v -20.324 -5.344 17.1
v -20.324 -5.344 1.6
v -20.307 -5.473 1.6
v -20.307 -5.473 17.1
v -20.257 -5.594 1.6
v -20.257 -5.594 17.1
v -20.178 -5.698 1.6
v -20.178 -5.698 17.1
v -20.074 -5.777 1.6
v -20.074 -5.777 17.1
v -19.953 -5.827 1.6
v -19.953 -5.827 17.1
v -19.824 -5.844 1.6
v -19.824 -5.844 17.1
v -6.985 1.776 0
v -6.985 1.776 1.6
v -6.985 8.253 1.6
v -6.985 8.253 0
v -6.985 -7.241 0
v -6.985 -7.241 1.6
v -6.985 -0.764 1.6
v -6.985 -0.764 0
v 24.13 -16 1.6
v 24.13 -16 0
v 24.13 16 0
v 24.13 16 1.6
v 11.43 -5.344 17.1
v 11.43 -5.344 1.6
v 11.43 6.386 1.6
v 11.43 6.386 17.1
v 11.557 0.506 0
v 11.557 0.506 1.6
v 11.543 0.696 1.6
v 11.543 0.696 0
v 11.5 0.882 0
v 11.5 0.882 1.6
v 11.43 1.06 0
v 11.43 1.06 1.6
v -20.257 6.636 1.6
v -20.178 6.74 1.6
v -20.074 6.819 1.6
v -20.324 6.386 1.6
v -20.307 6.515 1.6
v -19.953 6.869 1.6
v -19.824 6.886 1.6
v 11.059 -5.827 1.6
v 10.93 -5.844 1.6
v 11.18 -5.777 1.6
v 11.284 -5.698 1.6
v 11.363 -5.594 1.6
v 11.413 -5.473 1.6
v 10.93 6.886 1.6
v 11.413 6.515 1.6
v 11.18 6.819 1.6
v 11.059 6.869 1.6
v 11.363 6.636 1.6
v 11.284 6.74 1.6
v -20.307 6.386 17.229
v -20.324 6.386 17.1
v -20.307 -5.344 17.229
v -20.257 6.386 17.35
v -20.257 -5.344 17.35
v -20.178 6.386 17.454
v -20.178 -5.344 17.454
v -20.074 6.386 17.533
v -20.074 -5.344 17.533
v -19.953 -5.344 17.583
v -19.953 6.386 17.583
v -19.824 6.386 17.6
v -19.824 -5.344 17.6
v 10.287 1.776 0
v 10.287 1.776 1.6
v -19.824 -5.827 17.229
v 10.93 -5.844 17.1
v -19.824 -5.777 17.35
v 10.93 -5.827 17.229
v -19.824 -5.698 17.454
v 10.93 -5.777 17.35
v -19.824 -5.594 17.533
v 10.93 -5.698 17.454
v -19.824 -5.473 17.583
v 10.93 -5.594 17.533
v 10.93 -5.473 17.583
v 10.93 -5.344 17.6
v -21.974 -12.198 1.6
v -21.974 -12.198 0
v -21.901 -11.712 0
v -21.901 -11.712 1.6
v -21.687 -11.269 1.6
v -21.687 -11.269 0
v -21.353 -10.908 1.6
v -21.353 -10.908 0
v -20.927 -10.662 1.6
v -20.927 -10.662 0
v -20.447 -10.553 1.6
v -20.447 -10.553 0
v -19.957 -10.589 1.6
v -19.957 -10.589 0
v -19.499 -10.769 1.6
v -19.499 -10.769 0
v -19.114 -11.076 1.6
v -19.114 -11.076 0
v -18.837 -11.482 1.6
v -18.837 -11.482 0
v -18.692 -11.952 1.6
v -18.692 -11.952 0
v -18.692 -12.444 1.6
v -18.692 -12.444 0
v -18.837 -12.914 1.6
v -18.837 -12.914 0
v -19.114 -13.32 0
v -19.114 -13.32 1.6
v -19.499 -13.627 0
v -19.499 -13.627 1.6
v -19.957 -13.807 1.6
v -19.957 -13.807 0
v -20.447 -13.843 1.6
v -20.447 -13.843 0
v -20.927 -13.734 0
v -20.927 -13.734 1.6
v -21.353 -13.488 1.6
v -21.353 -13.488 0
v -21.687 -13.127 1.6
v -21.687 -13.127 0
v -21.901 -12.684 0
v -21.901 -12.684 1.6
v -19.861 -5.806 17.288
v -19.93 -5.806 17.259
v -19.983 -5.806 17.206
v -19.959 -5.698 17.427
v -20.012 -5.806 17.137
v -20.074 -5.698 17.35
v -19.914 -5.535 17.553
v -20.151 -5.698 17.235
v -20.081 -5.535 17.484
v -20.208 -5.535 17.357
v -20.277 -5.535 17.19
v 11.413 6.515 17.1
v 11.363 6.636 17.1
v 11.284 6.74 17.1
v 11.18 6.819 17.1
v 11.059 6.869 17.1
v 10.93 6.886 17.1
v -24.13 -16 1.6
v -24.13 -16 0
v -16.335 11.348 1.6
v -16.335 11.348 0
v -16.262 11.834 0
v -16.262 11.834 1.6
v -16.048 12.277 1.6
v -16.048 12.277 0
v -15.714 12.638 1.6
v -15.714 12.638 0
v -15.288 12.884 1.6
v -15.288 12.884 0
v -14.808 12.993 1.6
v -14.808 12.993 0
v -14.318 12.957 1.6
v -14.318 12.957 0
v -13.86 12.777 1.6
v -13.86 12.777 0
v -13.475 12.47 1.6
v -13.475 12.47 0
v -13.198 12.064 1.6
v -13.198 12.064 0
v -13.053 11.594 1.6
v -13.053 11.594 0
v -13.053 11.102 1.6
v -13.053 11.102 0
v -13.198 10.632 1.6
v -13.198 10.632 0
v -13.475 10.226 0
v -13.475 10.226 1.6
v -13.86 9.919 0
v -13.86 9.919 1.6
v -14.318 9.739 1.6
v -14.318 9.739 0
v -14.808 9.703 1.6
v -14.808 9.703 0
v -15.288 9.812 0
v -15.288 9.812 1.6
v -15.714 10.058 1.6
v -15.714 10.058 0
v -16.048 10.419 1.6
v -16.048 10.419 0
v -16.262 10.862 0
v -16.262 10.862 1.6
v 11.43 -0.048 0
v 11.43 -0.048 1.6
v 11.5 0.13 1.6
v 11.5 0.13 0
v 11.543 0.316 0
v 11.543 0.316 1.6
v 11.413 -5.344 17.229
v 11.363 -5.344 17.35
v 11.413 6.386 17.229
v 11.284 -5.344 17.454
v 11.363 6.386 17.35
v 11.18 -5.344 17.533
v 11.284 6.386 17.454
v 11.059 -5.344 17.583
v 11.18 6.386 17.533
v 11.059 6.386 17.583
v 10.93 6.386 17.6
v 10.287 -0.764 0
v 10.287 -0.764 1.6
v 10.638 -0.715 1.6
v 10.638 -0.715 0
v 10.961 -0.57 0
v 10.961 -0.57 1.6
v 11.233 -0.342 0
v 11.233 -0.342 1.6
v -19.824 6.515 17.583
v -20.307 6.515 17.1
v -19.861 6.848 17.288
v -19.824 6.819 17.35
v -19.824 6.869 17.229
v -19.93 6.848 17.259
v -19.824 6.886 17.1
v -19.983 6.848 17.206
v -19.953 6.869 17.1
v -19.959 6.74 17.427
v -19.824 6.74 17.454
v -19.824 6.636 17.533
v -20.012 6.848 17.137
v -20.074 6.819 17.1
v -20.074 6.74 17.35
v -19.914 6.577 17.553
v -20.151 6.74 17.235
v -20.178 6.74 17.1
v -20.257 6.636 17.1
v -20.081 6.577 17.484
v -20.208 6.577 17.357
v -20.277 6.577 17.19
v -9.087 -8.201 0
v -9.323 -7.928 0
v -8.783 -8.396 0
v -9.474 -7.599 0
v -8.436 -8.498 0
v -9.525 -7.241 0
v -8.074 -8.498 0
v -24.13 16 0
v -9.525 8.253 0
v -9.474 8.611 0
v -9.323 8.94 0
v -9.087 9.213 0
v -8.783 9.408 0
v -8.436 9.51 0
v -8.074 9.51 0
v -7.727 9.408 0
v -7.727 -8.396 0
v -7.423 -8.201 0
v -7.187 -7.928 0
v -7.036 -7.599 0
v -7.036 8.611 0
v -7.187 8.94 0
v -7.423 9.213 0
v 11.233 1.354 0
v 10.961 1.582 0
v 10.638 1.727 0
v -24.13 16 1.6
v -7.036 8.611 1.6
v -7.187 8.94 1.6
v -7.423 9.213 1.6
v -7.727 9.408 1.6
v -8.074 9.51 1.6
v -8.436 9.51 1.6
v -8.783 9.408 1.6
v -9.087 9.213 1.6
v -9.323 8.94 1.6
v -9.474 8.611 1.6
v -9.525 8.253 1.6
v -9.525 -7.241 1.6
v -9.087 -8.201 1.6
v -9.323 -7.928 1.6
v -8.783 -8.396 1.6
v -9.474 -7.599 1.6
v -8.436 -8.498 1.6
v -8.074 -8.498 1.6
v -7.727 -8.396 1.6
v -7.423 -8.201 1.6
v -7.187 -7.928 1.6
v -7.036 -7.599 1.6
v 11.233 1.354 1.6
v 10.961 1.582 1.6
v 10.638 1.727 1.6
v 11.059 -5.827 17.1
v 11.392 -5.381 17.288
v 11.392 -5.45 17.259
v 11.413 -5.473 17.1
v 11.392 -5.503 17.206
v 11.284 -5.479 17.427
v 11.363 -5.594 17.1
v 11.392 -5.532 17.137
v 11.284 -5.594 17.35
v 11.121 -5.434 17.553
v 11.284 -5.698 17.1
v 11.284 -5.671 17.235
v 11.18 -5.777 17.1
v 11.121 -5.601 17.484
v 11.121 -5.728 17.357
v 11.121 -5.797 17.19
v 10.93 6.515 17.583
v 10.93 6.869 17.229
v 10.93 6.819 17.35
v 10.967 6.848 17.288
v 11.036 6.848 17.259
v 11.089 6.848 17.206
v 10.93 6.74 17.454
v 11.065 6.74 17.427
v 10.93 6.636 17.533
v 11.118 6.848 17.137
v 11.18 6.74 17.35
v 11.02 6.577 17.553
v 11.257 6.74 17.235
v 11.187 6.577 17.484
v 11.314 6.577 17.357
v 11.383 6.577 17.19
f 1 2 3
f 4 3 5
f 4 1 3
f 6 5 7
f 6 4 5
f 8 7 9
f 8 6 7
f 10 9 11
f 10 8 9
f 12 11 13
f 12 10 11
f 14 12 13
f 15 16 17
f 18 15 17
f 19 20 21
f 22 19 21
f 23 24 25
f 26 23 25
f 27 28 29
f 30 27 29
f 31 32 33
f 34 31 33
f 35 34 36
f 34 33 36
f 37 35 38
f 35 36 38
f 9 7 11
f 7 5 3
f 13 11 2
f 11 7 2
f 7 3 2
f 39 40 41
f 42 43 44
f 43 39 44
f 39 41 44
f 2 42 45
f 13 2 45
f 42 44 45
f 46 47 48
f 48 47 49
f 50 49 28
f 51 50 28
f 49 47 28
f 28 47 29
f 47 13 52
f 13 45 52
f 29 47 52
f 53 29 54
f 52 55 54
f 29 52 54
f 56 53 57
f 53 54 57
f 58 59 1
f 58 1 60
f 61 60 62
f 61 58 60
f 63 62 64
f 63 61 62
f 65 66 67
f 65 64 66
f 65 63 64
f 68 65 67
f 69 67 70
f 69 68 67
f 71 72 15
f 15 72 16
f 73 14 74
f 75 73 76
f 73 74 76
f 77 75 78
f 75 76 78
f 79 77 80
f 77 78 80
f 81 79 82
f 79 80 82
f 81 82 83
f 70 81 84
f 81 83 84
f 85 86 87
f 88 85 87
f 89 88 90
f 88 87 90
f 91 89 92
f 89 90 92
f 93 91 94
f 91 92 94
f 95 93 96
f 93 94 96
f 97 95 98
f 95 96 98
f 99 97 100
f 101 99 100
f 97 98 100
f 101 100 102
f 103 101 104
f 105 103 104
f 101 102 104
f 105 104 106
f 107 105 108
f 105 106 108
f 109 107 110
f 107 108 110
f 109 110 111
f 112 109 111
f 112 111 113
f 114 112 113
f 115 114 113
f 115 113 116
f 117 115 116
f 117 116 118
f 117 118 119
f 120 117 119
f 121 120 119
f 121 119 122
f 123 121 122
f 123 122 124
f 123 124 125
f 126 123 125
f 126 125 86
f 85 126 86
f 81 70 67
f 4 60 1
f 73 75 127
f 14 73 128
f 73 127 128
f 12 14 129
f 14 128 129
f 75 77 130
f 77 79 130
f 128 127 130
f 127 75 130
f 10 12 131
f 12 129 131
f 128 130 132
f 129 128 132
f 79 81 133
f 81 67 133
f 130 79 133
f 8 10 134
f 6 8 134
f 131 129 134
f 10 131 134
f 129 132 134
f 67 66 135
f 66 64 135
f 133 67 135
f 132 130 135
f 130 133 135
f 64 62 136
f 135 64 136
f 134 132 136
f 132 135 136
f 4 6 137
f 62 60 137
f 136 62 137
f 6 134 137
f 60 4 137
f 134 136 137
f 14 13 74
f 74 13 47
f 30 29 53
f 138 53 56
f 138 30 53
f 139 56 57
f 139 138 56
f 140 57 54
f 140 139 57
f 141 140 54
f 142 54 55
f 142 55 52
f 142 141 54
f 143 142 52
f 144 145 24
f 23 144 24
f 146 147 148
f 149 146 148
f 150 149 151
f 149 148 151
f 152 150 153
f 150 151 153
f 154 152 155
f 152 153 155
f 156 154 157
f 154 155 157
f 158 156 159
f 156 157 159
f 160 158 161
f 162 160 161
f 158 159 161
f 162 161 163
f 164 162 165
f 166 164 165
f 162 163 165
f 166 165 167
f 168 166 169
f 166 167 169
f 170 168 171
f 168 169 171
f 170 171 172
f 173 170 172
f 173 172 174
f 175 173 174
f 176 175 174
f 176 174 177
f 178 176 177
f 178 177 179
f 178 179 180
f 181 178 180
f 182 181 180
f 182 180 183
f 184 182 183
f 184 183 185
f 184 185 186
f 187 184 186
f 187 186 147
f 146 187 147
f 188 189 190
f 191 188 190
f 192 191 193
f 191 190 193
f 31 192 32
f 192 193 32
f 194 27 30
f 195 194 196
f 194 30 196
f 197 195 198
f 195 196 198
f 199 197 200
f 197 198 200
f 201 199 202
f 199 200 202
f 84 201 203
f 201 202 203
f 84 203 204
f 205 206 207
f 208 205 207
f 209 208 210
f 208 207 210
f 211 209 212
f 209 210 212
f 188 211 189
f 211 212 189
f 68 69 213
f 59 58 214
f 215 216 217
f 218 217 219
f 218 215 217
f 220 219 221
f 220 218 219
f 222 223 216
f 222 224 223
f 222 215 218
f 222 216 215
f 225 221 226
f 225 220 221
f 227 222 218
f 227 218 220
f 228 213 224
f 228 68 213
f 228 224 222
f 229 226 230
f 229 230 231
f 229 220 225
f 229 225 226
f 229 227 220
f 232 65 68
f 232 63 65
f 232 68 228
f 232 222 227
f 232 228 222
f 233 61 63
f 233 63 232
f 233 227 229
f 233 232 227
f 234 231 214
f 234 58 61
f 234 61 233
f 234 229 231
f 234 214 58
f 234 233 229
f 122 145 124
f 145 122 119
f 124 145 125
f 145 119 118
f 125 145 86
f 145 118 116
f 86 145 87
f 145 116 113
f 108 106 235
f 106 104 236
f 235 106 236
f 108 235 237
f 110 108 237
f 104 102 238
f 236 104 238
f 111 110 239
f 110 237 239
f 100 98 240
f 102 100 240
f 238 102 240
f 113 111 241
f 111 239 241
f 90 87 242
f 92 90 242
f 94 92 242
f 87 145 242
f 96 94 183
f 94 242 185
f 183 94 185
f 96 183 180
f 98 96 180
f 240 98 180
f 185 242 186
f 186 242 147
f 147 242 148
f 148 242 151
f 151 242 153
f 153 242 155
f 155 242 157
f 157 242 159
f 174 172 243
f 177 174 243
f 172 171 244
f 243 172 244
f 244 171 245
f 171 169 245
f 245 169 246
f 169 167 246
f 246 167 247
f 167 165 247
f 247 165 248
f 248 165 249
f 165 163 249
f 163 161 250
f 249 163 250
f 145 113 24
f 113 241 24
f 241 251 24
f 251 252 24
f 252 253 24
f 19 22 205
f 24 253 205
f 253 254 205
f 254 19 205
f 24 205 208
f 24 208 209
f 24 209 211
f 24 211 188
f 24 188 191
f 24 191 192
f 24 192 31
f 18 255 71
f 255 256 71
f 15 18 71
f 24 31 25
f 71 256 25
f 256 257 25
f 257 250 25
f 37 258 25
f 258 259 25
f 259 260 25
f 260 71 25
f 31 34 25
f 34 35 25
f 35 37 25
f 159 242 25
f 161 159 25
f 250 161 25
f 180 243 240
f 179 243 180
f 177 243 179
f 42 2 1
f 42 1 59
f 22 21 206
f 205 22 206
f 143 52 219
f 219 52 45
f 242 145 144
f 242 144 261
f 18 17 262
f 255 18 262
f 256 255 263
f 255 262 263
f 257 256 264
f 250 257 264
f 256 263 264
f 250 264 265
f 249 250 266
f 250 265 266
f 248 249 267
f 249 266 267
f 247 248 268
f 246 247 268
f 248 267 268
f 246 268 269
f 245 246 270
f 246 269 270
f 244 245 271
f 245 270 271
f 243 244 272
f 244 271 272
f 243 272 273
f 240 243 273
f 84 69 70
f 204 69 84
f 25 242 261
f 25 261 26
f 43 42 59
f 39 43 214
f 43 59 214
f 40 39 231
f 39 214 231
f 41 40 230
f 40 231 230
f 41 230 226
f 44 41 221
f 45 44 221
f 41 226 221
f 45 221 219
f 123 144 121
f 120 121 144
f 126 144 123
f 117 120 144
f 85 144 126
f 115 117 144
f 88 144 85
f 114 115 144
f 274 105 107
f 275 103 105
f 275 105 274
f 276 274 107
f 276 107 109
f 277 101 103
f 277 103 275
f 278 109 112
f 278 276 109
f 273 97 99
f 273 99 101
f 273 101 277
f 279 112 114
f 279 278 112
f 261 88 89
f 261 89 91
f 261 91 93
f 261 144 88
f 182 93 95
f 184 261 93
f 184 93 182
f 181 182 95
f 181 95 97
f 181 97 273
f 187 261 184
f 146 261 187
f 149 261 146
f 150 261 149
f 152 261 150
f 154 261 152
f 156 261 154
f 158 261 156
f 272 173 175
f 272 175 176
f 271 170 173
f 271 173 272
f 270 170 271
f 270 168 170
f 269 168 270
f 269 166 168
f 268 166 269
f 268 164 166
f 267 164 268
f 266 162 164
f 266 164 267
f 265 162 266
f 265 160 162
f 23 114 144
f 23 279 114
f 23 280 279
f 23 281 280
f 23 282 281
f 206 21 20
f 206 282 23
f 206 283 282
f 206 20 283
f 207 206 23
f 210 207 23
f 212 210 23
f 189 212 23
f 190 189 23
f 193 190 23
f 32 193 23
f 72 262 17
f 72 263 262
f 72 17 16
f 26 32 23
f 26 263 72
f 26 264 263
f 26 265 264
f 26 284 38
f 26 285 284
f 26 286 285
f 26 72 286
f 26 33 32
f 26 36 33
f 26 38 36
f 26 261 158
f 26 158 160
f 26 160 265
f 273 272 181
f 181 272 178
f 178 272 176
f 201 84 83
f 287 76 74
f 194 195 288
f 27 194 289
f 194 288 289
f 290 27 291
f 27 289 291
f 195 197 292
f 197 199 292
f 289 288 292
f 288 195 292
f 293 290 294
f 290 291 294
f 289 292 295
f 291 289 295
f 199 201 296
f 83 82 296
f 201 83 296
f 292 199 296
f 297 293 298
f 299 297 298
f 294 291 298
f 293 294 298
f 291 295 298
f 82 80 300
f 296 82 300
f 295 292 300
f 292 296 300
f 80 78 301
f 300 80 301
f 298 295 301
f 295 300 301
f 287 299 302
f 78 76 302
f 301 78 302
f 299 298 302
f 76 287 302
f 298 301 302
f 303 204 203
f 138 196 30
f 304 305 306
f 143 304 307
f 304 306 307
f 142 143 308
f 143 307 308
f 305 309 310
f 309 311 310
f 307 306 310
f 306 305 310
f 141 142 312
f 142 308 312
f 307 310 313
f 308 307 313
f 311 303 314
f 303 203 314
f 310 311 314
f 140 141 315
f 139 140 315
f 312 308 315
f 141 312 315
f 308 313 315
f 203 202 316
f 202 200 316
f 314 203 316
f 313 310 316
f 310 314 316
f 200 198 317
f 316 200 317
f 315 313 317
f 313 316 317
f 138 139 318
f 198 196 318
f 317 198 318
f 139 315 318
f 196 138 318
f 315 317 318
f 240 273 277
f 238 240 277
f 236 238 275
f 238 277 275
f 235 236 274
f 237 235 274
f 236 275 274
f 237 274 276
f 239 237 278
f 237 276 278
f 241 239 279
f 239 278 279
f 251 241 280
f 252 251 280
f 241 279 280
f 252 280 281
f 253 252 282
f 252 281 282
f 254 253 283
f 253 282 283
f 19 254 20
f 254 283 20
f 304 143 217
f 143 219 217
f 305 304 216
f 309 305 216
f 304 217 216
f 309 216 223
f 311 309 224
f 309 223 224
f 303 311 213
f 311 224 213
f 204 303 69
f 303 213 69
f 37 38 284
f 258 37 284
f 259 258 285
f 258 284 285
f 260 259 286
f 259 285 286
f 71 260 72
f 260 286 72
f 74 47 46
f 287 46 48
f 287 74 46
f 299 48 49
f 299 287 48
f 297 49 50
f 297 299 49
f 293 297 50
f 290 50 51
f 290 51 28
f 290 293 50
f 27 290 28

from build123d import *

# Parameters (mm, degrees)
F0_W     = 48.26
F0_H     = 32
F1_DEPTH = 1.6
F2_W     = 1.27
F2_H     = 12.73
F3_DEPTH = 1.601
F2_W_2   = 10.799
F4_DEPTH = 16
F5_R     = 0.5
F6_D     = 3.3


with BuildPart() as f1:
    # F0 (on Top) → F1 (new body)
    with BuildSketch(Plane.XY):
        Rectangle(F0_W, F0_H)
    extrude(amount=F1_DEPTH)

    # F2 (on face) → F3 (cut, through all)
    with BuildSketch(Plane.XY.offset(1.6)):
        with Locations((-8.89, 0.521)):
            Rectangle(F2_W, F2_H)
        with BuildLine():
            Line((-9.525, 8.253), (-9.525, 6.886))
            Line((-9.525, 6.886), (-8.255, 6.886))
            Line((-8.255, 6.886), (-8.255, 6.983))
            ThreePointArc((-8.255, 6.983), (-9.1530256121, 7.3549743879), (-9.525, 8.253))
        make_face()
        with BuildLine():
            ThreePointArc((-6.985, 8.253), (-8.255, 9.523), (-9.525, 8.253))
            ThreePointArc((-9.525, 8.253), (-9.1530256121, 7.3549743879), (-8.255, 6.983))
            ThreePointArc((-8.255, 6.983), (-7.3569743879, 7.3549743879), (-6.985, 8.253))
        make_face()
        with BuildLine():
            Line((-8.255, 6.983), (-8.255, 6.886))
            Line((-8.255, 6.886), (-6.985, 6.886))
            Line((-6.985, 6.886), (-6.985, 8.253))
            ThreePointArc((-6.985, 8.253), (-7.3569743879, 7.3549743879), (-8.255, 6.983))
        make_face()
        with BuildLine():
            Line((-6.985, 6.886), (-8.255, 6.886))
            Line((-8.255, 6.886), (-8.255, -5.844))
            Line((-8.255, -5.844), (-6.985, -5.844))
            Line((-6.985, -5.844), (-6.985, -0.764))
            Line((-6.985, -0.764), (10.287, -0.764))
            ThreePointArc((10.287, -0.764), (9.017, 0.506), (10.287, 1.776))
            Line((10.287, 1.776), (-6.985, 1.776))
            Line((-6.985, 1.776), (-6.985, 6.886))
        make_face()
        with BuildLine():
            Line((-6.985, -5.844), (-8.255, -5.844))
            Line((-8.255, -5.844), (-8.255, -5.971))
            ThreePointArc((-8.255, -5.971), (-7.3569743879, -6.3429743879), (-6.985, -7.241))
            Line((-6.985, -7.241), (-6.985, -5.844))
        make_face()
        with BuildLine():
            Line((-8.255, -5.844), (-9.525, -5.844))
            Line((-9.525, -5.844), (-9.525, -7.241))
            ThreePointArc((-9.525, -7.241), (-9.1530256121, -6.3429743879), (-8.255, -5.971))
            Line((-8.255, -5.971), (-8.255, -5.844))
        make_face()
        with BuildLine():
            ThreePointArc((-8.255, -5.971), (-9.1530256121, -6.3429743879), (-9.525, -7.241))
            ThreePointArc((-9.525, -7.241), (-8.255, -8.511), (-6.985, -7.241))
            ThreePointArc((-6.985, -7.241), (-7.3569743879, -6.3429743879), (-8.255, -5.971))
        make_face()
        with BuildLine():
            Line((11.43, -0.0475801658), (11.43, 1.0595801658))
            ThreePointArc((11.43, 1.0595801658), (10.9614824643, 1.5820917272), (10.287, 1.776))
            ThreePointArc((10.287, 1.776), (9.017, 0.506), (10.287, -0.764))
            ThreePointArc((10.287, -0.764), (10.9614824643, -0.5700917272), (11.43, -0.0475801658))
        make_face()
        with BuildLine():
            ThreePointArc((11.557, 0.506), (11.5248428818, 0.7899806331), (11.43, 1.0595801658))
            Line((11.43, 1.0595801658), (11.43, -0.0475801658))
            ThreePointArc((11.43, -0.0475801658), (11.5248428818, 0.2220193669), (11.557, 0.506))
        make_face()
    extrude(amount=-F3_DEPTH, mode=Mode.SUBTRACT)

    # F6 (through all)
    with Locations(Plane.XY.offset(1.6)):
        with Locations((-14.685, 11.348), (-20.324, -12.198)):
            Hole(F6_D / 2)


with BuildPart() as f4:
    # F2 (on face) → F4 (new body)
    with BuildSketch(Plane.XY.offset(1.6)):
        with Locations((-14.9245, 0.521)):
            Rectangle(F2_W_2, F2_H)
        with Locations((-8.89, 0.521)):
            Rectangle(F2_W, F2_H)
        with BuildLine():
            Line((-6.985, 6.886), (-8.255, 6.886))
            Line((-8.255, 6.886), (-8.255, -5.844))
            Line((-8.255, -5.844), (-6.985, -5.844))
            Line((-6.985, -5.844), (-6.985, -0.764))
            Line((-6.985, -0.764), (10.287, -0.764))
            ThreePointArc((10.287, -0.764), (9.017, 0.506), (10.287, 1.776))
            Line((10.287, 1.776), (-6.985, 1.776))
            Line((-6.985, 1.776), (-6.985, 6.886))
        make_face()
        with BuildLine():
            Line((11.43, 6.886), (-6.985, 6.886))
            Line((-6.985, 6.886), (-6.985, 1.776))
            Line((-6.985, 1.776), (10.287, 1.776))
            ThreePointArc((10.287, 1.776), (10.9614824643, 1.5820917272), (11.43, 1.0595801658))
            Line((11.43, 1.0595801658), (11.43, 6.886))
        make_face()
        with BuildLine():
            Line((11.43, -0.0475801658), (11.43, 1.0595801658))
            ThreePointArc((11.43, 1.0595801658), (10.9614824643, 1.5820917272), (10.287, 1.776))
            ThreePointArc((10.287, 1.776), (9.017, 0.506), (10.287, -0.764))
            ThreePointArc((10.287, -0.764), (10.9614824643, -0.5700917272), (11.43, -0.0475801658))
        make_face()
        with BuildLine():
            Line((-6.985, -0.764), (-6.985, -5.844))
            Line((-6.985, -5.844), (11.43, -5.844))
            Line((11.43, -5.844), (11.43, -0.0475801658))
            ThreePointArc((11.43, -0.0475801658), (10.9614824643, -0.5700917272), (10.287, -0.764))
            Line((10.287, -0.764), (-6.985, -0.764))
        make_face()
    extrude(amount=F4_DEPTH)

    # F5
    f5_edges = [f4.edges().sort_by_distance(p)[0] for p in [
        (-20.324, 0.521, 17.6),
        (-4.447, -5.844, 17.6),
        (11.43, 0.521, 17.6),
        (-4.447, 6.886, 17.6),
        (-20.324, -5.844, 9.6),
        (11.43, -5.844, 9.6),
        (11.43, 6.886, 9.6),
        (-20.324, 6.886, 9.6),
    ]]
    fillet(f5_edges, radius=F5_R)


solid = Compound([f1.part, f4.part])
